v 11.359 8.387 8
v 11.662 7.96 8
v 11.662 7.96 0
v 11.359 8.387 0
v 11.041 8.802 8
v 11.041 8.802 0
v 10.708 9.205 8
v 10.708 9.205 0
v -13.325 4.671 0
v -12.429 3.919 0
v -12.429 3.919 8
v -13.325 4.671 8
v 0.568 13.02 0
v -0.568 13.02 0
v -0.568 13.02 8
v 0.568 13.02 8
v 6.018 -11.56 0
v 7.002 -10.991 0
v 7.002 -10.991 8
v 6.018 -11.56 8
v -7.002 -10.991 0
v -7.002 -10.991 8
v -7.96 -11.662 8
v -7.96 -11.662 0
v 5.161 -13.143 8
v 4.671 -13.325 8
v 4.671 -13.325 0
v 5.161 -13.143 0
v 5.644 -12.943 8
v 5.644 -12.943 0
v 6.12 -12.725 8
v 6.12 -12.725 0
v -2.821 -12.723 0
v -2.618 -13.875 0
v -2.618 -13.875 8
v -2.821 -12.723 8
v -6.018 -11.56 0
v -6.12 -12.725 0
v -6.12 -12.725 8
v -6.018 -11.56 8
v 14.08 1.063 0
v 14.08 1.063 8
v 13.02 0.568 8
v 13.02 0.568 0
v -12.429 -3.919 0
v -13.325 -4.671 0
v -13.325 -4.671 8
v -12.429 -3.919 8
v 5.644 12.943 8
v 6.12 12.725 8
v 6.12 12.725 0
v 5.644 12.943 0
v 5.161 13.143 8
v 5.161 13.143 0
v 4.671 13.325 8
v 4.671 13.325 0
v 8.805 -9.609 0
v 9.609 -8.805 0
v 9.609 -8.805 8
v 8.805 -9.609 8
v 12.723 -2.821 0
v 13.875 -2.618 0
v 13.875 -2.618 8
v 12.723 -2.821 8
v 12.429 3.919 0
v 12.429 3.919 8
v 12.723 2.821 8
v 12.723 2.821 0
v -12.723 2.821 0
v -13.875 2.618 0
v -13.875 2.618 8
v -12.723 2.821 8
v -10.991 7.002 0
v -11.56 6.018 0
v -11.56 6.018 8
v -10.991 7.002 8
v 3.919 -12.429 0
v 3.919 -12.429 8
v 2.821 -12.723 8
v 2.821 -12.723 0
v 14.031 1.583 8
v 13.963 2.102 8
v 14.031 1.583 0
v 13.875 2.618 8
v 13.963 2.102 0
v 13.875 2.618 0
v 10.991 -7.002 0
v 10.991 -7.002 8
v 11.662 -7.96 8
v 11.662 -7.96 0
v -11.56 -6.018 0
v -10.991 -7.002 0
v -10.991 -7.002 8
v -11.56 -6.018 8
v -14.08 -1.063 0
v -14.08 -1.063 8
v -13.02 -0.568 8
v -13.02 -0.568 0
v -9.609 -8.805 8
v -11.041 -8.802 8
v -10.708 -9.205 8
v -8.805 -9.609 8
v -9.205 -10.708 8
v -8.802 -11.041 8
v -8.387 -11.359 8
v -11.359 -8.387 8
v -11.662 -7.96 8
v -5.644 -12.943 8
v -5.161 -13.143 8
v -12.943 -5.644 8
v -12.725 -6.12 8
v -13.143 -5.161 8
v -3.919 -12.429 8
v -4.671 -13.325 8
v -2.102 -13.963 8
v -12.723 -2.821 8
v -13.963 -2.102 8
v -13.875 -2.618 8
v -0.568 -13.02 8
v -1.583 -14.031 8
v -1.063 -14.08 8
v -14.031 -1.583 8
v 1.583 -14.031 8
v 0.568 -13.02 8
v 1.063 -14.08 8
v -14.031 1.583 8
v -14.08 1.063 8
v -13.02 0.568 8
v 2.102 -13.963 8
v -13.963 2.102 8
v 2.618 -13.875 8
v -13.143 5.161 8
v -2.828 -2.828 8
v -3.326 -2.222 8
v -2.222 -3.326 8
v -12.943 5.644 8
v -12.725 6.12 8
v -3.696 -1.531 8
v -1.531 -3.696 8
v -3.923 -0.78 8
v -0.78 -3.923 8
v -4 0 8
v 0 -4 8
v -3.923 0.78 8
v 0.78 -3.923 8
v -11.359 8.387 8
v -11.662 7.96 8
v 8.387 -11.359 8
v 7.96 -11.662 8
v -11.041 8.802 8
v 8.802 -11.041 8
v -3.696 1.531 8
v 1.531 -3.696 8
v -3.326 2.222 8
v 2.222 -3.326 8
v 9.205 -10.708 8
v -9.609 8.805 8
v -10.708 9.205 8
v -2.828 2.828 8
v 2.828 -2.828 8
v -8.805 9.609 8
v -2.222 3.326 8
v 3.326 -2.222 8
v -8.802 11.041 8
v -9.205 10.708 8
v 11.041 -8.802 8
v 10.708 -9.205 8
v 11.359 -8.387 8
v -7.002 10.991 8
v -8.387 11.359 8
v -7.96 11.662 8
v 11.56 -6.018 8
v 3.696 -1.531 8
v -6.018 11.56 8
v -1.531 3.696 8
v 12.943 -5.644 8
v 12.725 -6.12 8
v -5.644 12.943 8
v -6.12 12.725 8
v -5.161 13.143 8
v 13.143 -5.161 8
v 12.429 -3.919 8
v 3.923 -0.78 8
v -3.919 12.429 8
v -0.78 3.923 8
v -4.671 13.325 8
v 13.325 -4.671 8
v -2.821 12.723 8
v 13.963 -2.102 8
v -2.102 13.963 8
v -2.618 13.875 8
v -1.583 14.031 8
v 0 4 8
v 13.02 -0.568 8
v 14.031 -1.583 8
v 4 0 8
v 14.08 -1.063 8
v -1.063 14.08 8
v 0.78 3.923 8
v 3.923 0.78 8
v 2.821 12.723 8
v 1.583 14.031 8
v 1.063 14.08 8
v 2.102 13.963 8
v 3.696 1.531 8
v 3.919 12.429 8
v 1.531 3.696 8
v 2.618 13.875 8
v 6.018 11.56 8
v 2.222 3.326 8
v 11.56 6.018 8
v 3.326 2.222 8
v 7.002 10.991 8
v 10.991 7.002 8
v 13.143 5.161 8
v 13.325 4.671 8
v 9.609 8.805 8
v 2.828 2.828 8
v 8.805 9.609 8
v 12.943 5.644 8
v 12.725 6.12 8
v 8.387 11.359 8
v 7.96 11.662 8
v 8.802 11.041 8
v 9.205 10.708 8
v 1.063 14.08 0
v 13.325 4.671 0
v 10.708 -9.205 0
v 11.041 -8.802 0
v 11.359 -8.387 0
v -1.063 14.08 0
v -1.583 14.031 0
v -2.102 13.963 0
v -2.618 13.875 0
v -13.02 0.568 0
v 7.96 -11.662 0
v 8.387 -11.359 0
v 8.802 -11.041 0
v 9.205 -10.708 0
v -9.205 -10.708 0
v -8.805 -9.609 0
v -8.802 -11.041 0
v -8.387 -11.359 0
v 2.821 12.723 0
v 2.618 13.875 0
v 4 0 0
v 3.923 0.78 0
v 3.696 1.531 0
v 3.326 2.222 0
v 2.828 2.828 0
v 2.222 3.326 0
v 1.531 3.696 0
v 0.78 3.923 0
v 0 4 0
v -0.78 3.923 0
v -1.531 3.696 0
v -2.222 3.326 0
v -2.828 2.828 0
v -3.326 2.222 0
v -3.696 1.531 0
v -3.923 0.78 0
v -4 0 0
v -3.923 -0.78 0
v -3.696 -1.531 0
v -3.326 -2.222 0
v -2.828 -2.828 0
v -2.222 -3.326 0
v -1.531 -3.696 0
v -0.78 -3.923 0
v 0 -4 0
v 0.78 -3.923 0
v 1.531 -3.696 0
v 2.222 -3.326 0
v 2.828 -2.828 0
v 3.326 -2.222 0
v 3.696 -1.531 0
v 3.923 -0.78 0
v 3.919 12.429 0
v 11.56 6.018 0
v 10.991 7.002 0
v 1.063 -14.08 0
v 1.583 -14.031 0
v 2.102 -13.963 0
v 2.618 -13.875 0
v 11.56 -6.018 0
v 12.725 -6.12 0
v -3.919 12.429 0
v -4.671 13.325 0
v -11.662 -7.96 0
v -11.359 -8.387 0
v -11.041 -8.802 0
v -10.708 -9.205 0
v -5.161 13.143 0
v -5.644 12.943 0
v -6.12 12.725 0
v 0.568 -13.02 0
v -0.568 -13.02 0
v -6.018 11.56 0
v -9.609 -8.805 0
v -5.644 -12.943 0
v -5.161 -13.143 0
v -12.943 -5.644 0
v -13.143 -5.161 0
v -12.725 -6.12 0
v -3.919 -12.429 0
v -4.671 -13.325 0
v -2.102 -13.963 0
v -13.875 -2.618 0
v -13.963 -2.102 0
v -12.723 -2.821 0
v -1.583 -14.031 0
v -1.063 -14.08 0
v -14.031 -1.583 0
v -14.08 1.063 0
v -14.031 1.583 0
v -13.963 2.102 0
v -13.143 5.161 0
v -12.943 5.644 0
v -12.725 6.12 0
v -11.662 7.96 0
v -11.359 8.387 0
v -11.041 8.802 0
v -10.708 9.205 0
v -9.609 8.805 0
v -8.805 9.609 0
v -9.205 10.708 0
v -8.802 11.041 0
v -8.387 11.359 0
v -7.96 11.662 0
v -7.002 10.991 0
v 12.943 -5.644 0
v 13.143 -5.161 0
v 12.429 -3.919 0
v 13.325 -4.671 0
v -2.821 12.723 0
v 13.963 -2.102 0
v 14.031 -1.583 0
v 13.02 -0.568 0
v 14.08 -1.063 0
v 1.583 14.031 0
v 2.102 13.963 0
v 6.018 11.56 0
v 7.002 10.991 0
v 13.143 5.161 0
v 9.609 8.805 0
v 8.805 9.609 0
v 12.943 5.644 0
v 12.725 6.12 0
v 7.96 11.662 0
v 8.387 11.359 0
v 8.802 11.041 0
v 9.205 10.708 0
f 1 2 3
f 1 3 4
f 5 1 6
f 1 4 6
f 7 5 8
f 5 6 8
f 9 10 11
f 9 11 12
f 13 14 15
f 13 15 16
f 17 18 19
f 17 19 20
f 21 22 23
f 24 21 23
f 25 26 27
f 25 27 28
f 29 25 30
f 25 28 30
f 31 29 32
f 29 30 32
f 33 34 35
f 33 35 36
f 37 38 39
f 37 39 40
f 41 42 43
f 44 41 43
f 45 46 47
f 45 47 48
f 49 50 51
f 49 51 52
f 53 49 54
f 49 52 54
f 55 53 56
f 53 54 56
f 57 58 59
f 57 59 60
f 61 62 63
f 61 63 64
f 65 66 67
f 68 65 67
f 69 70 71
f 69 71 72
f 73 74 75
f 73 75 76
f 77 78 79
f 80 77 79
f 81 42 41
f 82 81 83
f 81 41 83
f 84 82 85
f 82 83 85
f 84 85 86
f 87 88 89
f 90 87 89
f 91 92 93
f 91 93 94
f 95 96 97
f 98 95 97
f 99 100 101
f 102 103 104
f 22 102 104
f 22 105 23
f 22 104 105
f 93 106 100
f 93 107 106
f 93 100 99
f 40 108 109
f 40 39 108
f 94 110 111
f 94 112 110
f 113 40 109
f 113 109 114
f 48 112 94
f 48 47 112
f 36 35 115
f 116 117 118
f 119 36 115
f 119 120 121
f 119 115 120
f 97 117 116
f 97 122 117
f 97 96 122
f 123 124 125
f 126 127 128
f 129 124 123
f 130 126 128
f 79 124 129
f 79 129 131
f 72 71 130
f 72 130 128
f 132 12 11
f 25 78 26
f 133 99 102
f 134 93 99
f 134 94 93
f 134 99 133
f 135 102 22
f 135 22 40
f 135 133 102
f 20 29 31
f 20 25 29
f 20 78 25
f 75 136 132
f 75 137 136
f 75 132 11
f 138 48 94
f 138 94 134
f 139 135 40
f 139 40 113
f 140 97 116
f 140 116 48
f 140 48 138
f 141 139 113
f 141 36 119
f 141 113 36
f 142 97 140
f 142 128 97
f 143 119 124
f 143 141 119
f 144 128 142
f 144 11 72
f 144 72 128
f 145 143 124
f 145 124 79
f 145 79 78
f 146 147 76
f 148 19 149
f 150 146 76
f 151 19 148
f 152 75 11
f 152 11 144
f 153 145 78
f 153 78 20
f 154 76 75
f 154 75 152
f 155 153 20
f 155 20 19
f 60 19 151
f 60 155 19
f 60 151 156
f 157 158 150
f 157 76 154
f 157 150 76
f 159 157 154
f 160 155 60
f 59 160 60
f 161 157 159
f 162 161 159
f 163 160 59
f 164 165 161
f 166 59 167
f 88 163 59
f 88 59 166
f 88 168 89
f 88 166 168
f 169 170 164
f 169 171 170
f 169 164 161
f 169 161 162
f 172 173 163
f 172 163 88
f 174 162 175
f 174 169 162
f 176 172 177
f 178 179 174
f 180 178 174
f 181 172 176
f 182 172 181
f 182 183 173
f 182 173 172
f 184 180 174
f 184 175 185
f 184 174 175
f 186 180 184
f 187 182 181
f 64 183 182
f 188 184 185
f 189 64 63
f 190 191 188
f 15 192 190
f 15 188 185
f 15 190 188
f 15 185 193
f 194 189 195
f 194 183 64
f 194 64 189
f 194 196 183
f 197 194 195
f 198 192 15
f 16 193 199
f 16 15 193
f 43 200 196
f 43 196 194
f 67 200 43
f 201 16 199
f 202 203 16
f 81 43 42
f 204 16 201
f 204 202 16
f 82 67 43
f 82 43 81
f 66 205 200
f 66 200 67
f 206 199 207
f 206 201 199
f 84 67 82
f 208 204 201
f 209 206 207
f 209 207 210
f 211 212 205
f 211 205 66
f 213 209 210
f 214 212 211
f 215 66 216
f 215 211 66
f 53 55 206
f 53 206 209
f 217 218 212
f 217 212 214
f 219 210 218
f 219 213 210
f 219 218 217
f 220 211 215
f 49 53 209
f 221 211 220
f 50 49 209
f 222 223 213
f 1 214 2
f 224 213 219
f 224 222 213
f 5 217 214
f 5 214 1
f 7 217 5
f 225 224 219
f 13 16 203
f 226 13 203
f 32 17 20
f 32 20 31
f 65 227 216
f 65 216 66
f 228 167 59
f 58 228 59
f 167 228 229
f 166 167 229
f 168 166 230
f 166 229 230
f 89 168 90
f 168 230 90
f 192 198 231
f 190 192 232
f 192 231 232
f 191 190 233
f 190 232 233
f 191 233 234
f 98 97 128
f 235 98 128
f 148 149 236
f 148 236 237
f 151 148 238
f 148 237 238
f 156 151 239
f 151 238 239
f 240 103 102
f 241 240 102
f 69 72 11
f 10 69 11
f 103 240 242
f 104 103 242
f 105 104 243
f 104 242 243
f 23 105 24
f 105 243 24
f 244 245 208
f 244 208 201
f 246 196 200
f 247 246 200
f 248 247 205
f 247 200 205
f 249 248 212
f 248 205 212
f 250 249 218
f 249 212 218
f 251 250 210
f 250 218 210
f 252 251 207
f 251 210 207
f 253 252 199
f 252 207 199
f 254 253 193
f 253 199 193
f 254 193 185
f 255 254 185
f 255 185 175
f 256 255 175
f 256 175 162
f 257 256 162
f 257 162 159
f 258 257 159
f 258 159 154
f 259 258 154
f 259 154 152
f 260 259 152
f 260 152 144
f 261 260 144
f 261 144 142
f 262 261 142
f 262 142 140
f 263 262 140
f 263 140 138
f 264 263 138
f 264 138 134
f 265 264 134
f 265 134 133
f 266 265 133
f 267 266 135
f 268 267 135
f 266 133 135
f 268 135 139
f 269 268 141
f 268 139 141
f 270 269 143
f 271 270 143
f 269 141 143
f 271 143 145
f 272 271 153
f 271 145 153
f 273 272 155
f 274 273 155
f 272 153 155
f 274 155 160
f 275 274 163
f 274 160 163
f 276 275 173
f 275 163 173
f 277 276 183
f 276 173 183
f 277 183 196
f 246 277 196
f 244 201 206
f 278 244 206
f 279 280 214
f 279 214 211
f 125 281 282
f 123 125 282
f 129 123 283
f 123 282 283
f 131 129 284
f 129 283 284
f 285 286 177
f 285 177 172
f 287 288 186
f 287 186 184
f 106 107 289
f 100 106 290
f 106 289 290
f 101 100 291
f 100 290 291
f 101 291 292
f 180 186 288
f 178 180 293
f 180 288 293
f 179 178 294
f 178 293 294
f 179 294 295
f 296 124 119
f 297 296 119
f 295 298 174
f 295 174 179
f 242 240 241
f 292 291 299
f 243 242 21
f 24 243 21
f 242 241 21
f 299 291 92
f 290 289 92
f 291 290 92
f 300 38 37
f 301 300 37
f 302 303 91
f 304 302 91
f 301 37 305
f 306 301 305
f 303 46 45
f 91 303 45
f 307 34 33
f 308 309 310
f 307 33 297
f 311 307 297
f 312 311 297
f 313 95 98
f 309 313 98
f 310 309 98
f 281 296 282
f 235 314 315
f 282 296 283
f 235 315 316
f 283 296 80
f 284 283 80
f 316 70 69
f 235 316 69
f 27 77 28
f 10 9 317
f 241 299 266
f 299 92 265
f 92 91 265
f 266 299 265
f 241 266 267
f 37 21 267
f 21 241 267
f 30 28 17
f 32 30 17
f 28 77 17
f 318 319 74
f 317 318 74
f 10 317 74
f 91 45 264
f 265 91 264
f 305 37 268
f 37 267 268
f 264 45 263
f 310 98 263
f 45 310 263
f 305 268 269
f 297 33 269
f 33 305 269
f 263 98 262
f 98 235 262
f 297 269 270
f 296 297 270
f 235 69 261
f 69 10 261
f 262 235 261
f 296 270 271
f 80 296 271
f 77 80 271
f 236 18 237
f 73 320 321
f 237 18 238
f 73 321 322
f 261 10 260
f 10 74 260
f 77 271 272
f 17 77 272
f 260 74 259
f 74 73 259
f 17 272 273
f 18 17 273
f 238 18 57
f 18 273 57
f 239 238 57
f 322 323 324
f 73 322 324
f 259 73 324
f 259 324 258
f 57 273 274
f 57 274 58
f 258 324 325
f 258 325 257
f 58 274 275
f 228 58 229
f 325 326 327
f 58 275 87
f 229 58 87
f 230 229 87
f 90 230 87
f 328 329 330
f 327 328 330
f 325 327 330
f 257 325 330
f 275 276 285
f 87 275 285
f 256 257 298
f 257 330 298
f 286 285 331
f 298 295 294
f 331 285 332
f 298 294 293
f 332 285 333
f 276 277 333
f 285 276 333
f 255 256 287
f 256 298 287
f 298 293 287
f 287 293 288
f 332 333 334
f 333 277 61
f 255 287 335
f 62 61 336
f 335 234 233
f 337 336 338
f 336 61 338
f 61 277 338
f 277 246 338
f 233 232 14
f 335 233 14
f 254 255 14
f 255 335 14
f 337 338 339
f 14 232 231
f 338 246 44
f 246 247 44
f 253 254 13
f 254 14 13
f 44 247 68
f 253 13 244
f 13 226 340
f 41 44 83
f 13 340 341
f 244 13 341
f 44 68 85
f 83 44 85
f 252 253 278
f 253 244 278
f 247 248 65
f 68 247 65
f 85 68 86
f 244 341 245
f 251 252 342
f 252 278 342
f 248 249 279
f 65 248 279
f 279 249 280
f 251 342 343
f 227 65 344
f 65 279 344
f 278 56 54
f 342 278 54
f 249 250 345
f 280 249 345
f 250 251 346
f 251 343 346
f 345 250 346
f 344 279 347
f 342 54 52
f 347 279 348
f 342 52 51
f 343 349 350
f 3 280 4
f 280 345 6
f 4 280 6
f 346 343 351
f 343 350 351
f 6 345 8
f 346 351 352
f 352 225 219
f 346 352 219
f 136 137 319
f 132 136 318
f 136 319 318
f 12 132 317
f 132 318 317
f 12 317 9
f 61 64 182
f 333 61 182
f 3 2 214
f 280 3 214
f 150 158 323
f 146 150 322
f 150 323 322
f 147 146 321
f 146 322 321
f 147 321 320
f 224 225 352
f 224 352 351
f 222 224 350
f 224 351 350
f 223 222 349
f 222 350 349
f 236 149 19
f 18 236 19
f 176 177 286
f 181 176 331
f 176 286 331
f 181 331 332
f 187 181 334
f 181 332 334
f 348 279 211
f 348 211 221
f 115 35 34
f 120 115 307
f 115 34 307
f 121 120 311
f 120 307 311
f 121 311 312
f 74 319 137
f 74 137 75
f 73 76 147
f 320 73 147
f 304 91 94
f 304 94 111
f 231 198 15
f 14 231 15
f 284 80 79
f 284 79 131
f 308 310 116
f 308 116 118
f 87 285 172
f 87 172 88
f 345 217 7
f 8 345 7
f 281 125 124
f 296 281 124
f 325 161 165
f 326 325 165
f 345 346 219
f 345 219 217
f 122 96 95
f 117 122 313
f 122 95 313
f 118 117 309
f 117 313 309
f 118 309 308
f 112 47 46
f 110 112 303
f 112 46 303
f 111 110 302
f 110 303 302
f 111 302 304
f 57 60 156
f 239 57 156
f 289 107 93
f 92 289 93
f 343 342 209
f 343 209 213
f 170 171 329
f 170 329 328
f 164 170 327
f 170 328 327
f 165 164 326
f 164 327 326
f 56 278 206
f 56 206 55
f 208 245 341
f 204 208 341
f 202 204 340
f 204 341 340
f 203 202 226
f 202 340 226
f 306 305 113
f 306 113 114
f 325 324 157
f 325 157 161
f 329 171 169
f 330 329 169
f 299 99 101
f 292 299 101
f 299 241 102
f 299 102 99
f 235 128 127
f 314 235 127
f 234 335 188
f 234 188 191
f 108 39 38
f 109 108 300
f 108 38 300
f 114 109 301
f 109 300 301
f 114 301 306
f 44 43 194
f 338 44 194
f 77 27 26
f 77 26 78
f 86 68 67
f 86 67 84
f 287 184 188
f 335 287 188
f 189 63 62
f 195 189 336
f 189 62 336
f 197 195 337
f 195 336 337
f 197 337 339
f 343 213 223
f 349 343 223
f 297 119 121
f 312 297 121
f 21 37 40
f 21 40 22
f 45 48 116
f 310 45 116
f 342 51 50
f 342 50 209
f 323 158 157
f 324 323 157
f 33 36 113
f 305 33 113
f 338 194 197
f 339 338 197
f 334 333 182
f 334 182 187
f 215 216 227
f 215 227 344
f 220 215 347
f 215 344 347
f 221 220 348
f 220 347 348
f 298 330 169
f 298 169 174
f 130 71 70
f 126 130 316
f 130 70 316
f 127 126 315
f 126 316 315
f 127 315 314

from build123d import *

# Parameters (mm, degrees)
ESQUISSE1_R                  = 14.12
EXTRUSION1_DEPTH             = 8
EXTRUSION2_DEPTH             = 22.511596872
R_P_TITION_CIRCULAIRE1_DEPTH = 8
ESQUISSE3_R                  = 4
EXTRUSION3_DEPTH             = 22.459027804


# Read off the part's stored shape, not the designer's step: Répétition circulaire1
with BuildPart() as part:
    # Esquisse1 → Extrusion1 (new body)
    with BuildSketch(Plane.XY):
        Circle(ESQUISSE1_R)
    extrude(amount=EXTRUSION1_DEPTH)

    # Esquisse2 → Extrusion2 (cut, through all)
    with BuildSketch(Plane.XY.offset(8)):
        Polygon((-0.5685, 13.02), (0.5685, 13.02), (2.149770097, 16.411044667), (-2.149770097, 16.411044667), align=None)
    extrude(amount=-EXTRUSION2_DEPTH, mode=Mode.SUBTRACT)

    # Répétition circulaire1 outline → Répétition circulaire1 (cut)
    with BuildSketch(Plane.XY):
        with BuildLine():
            ThreePointArc((-2.617609549, 13.875248475), (-3.654524917, 13.638872667), (-4.670707871, 13.325122438))
            Line((-4.670707871, 13.325122438), (-3.918952799, 12.429215631))
            Line((-3.918952799, 12.429215631), (-2.820695135, 12.723492885))
            Line((-2.820695135, 12.723492885), (-2.617609549, 13.875248475))
        make_face()
        with BuildLine():
            Line((3.918952799, 12.429215631), (4.670707871, 13.325122438))
            ThreePointArc((4.670707871, 13.325122438), (3.654524917, 13.638872667), (2.617609549, 13.875248475))
            Line((2.617609549, 13.875248475), (2.820695135, 12.723492885))
            Line((2.820695135, 12.723492885), (3.918952799, 12.429215631))
        make_face()
        with BuildLine():
            Line((7.002335442, 10.991400757), (7.960352825, 11.66221175))
            ThreePointArc((7.960352825, 11.66221175), (7.06, 12.228278701), (6.119595228, 12.724973644))
            Line((6.119595228, 12.724973644), (6.017664558, 11.559900757))
            Line((6.017664558, 11.559900757), (7.002335442, 10.991400757))
        make_face()
        with BuildLine():
            Line((9.608520496, 8.804540086), (10.707512889, 9.204540604))
            ThreePointArc((10.707512889, 9.204540604), (9.98434775, 9.98434775), (9.204540604, 10.707512889))
            Line((9.204540604, 10.707512889), (8.804540086, 9.608520496))
            Line((8.804540086, 9.608520496), (9.608520496, 8.804540086))
        make_face()
        with BuildLine():
            Line((11.559900757, 6.017664558), (12.724973644, 6.119595228))
            ThreePointArc((12.724973644, 6.119595228), (12.228278701, 7.06), (11.66221175, 7.960352825))
            Line((11.66221175, 7.960352825), (10.991400757, 7.002335442))
            Line((10.991400757, 7.002335442), (11.559900757, 6.017664558))
        make_face()
        with BuildLine():
            Line((12.723492885, 2.820695135), (13.875248475, 2.617609549))
            ThreePointArc((13.875248475, 2.617609549), (13.638872667, 3.654524917), (13.325122438, 4.670707871))
            Line((13.325122438, 4.670707871), (12.429215631, 3.918952799))
            Line((12.429215631, 3.918952799), (12.723492885, 2.820695135))
        make_face()
        with BuildLine():
            Line((13.02, -0.5685), (14.079948052, -1.062761894))
            ThreePointArc((14.079948052, -1.062761894), (14.12, 0), (14.079948052, 1.062761894))
            Line((14.079948052, 1.062761894), (13.02, 0.5685))
            Line((13.02, 0.5685), (13.02, -0.5685))
        make_face()
        with BuildLine():
            Line((12.429215631, -3.918952799), (13.325122438, -4.670707871))
            ThreePointArc((13.325122438, -4.670707871), (13.638872667, -3.654524917), (13.875248475, -2.617609549))
            Line((13.875248475, -2.617609549), (12.723492885, -2.820695135))
            Line((12.723492885, -2.820695135), (12.429215631, -3.918952799))
        make_face()
        with BuildLine():
            Line((10.991400757, -7.002335442), (11.66221175, -7.960352825))
            ThreePointArc((11.66221175, -7.960352825), (12.228278701, -7.06), (12.724973644, -6.119595228))
            Line((12.724973644, -6.119595228), (11.559900757, -6.017664558))
            Line((11.559900757, -6.017664558), (10.991400757, -7.002335442))
        make_face()
        with BuildLine():
            Line((8.804540086, -9.608520496), (9.204540604, -10.707512889))
            ThreePointArc((9.204540604, -10.707512889), (9.98434775, -9.98434775), (10.707512889, -9.204540604))
            Line((10.707512889, -9.204540604), (9.608520496, -8.804540086))
            Line((9.608520496, -8.804540086), (8.804540086, -9.608520496))
        make_face()
        with BuildLine():
            Line((6.017664558, -11.559900757), (6.119595228, -12.724973644))
            ThreePointArc((6.119595228, -12.724973644), (7.06, -12.228278701), (7.960352825, -11.66221175))
            Line((7.960352825, -11.66221175), (7.002335442, -10.991400757))
            Line((7.002335442, -10.991400757), (6.017664558, -11.559900757))
        make_face()
        with BuildLine():
            Line((2.820695135, -12.723492885), (2.617609549, -13.875248475))
            ThreePointArc((2.617609549, -13.875248475), (3.654524917, -13.638872667), (4.670707871, -13.325122438))
            Line((4.670707871, -13.325122438), (3.918952799, -12.429215631))
            Line((3.918952799, -12.429215631), (2.820695135, -12.723492885))
        make_face()
        with BuildLine():
            Line((-0.5685, -13.02), (-1.062761894, -14.079948052))
            ThreePointArc((-1.062761894, -14.079948052), (0, -14.12), (1.062761894, -14.079948052))
            Line((1.062761894, -14.079948052), (0.5685, -13.02))
            Line((0.5685, -13.02), (-0.5685, -13.02))
        make_face()
        with BuildLine():
            Line((-3.918952799, -12.429215631), (-4.670707871, -13.325122438))
            ThreePointArc((-4.670707871, -13.325122438), (-3.654524917, -13.638872667), (-2.617609549, -13.875248475))
            Line((-2.617609549, -13.875248475), (-2.820695135, -12.723492885))
            Line((-2.820695135, -12.723492885), (-3.918952799, -12.429215631))
        make_face()
        with BuildLine():
            Line((-7.002335442, -10.991400757), (-7.960352825, -11.66221175))
            ThreePointArc((-7.960352825, -11.66221175), (-7.06, -12.228278701), (-6.119595228, -12.724973644))
            Line((-6.119595228, -12.724973644), (-6.017664558, -11.559900757))
            Line((-6.017664558, -11.559900757), (-7.002335442, -10.991400757))
        make_face()
        with BuildLine():
            Line((-9.608520496, -8.804540086), (-10.707512889, -9.204540604))
            ThreePointArc((-10.707512889, -9.204540604), (-9.98434775, -9.98434775), (-9.204540604, -10.707512889))
            Line((-9.204540604, -10.707512889), (-8.804540086, -9.608520496))
            Line((-8.804540086, -9.608520496), (-9.608520496, -8.804540086))
        make_face()
        with BuildLine():
            Line((-11.559900757, -6.017664558), (-12.724973644, -6.119595228))
            ThreePointArc((-12.724973644, -6.119595228), (-12.228278701, -7.06), (-11.66221175, -7.960352825))
            Line((-11.66221175, -7.960352825), (-10.991400757, -7.002335442))
            Line((-10.991400757, -7.002335442), (-11.559900757, -6.017664558))
        make_face()
        with BuildLine():
            Line((-12.723492885, -2.820695135), (-13.875248475, -2.617609549))
            ThreePointArc((-13.875248475, -2.617609549), (-13.638872667, -3.654524917), (-13.325122438, -4.670707871))
            Line((-13.325122438, -4.670707871), (-12.429215631, -3.918952799))
            Line((-12.429215631, -3.918952799), (-12.723492885, -2.820695135))
        make_face()
        with BuildLine():
            Line((-13.02, 0.5685), (-14.079948052, 1.062761894))
            ThreePointArc((-14.079948052, 1.062761894), (-14.12, 0), (-14.079948052, -1.062761894))
            Line((-14.079948052, -1.062761894), (-13.02, -0.5685))
            Line((-13.02, -0.5685), (-13.02, 0.5685))
        make_face()
        with BuildLine():
            Line((-12.429215631, 3.918952799), (-13.325122438, 4.670707871))
            ThreePointArc((-13.325122438, 4.670707871), (-13.638872667, 3.654524917), (-13.875248475, 2.617609549))
            Line((-13.875248475, 2.617609549), (-12.723492885, 2.820695135))
            Line((-12.723492885, 2.820695135), (-12.429215631, 3.918952799))
        make_face()
        with BuildLine():
            Line((-10.991400757, 7.002335442), (-11.66221175, 7.960352825))
            ThreePointArc((-11.66221175, 7.960352825), (-12.228278701, 7.06), (-12.724973644, 6.119595228))
            Line((-12.724973644, 6.119595228), (-11.559900757, 6.017664558))
            Line((-11.559900757, 6.017664558), (-10.991400757, 7.002335442))
        make_face()
        with BuildLine():
            Line((-8.804540086, 9.608520496), (-9.204540604, 10.707512889))
            ThreePointArc((-9.204540604, 10.707512889), (-9.98434775, 9.98434775), (-10.707512889, 9.204540604))
            Line((-10.707512889, 9.204540604), (-9.608520496, 8.804540086))
            Line((-9.608520496, 8.804540086), (-8.804540086, 9.608520496))
        make_face()
        with BuildLine():
            Line((-6.017664558, 11.559900757), (-6.119595228, 12.724973644))
            ThreePointArc((-6.119595228, 12.724973644), (-7.06, 12.228278701), (-7.960352825, 11.66221175))
            Line((-7.960352825, 11.66221175), (-7.002335442, 10.991400757))
            Line((-7.002335442, 10.991400757), (-6.017664558, 11.559900757))
        make_face()
    extrude(amount=R_P_TITION_CIRCULAIRE1_DEPTH, mode=Mode.SUBTRACT)

    # Esquisse3 → Extrusion3 (cut, through all)
    with BuildSketch(Plane.XY.offset(8)):
        Circle(ESQUISSE3_R)
    extrude(amount=-EXTRUSION3_DEPTH, mode=Mode.SUBTRACT)


solid = part.part
